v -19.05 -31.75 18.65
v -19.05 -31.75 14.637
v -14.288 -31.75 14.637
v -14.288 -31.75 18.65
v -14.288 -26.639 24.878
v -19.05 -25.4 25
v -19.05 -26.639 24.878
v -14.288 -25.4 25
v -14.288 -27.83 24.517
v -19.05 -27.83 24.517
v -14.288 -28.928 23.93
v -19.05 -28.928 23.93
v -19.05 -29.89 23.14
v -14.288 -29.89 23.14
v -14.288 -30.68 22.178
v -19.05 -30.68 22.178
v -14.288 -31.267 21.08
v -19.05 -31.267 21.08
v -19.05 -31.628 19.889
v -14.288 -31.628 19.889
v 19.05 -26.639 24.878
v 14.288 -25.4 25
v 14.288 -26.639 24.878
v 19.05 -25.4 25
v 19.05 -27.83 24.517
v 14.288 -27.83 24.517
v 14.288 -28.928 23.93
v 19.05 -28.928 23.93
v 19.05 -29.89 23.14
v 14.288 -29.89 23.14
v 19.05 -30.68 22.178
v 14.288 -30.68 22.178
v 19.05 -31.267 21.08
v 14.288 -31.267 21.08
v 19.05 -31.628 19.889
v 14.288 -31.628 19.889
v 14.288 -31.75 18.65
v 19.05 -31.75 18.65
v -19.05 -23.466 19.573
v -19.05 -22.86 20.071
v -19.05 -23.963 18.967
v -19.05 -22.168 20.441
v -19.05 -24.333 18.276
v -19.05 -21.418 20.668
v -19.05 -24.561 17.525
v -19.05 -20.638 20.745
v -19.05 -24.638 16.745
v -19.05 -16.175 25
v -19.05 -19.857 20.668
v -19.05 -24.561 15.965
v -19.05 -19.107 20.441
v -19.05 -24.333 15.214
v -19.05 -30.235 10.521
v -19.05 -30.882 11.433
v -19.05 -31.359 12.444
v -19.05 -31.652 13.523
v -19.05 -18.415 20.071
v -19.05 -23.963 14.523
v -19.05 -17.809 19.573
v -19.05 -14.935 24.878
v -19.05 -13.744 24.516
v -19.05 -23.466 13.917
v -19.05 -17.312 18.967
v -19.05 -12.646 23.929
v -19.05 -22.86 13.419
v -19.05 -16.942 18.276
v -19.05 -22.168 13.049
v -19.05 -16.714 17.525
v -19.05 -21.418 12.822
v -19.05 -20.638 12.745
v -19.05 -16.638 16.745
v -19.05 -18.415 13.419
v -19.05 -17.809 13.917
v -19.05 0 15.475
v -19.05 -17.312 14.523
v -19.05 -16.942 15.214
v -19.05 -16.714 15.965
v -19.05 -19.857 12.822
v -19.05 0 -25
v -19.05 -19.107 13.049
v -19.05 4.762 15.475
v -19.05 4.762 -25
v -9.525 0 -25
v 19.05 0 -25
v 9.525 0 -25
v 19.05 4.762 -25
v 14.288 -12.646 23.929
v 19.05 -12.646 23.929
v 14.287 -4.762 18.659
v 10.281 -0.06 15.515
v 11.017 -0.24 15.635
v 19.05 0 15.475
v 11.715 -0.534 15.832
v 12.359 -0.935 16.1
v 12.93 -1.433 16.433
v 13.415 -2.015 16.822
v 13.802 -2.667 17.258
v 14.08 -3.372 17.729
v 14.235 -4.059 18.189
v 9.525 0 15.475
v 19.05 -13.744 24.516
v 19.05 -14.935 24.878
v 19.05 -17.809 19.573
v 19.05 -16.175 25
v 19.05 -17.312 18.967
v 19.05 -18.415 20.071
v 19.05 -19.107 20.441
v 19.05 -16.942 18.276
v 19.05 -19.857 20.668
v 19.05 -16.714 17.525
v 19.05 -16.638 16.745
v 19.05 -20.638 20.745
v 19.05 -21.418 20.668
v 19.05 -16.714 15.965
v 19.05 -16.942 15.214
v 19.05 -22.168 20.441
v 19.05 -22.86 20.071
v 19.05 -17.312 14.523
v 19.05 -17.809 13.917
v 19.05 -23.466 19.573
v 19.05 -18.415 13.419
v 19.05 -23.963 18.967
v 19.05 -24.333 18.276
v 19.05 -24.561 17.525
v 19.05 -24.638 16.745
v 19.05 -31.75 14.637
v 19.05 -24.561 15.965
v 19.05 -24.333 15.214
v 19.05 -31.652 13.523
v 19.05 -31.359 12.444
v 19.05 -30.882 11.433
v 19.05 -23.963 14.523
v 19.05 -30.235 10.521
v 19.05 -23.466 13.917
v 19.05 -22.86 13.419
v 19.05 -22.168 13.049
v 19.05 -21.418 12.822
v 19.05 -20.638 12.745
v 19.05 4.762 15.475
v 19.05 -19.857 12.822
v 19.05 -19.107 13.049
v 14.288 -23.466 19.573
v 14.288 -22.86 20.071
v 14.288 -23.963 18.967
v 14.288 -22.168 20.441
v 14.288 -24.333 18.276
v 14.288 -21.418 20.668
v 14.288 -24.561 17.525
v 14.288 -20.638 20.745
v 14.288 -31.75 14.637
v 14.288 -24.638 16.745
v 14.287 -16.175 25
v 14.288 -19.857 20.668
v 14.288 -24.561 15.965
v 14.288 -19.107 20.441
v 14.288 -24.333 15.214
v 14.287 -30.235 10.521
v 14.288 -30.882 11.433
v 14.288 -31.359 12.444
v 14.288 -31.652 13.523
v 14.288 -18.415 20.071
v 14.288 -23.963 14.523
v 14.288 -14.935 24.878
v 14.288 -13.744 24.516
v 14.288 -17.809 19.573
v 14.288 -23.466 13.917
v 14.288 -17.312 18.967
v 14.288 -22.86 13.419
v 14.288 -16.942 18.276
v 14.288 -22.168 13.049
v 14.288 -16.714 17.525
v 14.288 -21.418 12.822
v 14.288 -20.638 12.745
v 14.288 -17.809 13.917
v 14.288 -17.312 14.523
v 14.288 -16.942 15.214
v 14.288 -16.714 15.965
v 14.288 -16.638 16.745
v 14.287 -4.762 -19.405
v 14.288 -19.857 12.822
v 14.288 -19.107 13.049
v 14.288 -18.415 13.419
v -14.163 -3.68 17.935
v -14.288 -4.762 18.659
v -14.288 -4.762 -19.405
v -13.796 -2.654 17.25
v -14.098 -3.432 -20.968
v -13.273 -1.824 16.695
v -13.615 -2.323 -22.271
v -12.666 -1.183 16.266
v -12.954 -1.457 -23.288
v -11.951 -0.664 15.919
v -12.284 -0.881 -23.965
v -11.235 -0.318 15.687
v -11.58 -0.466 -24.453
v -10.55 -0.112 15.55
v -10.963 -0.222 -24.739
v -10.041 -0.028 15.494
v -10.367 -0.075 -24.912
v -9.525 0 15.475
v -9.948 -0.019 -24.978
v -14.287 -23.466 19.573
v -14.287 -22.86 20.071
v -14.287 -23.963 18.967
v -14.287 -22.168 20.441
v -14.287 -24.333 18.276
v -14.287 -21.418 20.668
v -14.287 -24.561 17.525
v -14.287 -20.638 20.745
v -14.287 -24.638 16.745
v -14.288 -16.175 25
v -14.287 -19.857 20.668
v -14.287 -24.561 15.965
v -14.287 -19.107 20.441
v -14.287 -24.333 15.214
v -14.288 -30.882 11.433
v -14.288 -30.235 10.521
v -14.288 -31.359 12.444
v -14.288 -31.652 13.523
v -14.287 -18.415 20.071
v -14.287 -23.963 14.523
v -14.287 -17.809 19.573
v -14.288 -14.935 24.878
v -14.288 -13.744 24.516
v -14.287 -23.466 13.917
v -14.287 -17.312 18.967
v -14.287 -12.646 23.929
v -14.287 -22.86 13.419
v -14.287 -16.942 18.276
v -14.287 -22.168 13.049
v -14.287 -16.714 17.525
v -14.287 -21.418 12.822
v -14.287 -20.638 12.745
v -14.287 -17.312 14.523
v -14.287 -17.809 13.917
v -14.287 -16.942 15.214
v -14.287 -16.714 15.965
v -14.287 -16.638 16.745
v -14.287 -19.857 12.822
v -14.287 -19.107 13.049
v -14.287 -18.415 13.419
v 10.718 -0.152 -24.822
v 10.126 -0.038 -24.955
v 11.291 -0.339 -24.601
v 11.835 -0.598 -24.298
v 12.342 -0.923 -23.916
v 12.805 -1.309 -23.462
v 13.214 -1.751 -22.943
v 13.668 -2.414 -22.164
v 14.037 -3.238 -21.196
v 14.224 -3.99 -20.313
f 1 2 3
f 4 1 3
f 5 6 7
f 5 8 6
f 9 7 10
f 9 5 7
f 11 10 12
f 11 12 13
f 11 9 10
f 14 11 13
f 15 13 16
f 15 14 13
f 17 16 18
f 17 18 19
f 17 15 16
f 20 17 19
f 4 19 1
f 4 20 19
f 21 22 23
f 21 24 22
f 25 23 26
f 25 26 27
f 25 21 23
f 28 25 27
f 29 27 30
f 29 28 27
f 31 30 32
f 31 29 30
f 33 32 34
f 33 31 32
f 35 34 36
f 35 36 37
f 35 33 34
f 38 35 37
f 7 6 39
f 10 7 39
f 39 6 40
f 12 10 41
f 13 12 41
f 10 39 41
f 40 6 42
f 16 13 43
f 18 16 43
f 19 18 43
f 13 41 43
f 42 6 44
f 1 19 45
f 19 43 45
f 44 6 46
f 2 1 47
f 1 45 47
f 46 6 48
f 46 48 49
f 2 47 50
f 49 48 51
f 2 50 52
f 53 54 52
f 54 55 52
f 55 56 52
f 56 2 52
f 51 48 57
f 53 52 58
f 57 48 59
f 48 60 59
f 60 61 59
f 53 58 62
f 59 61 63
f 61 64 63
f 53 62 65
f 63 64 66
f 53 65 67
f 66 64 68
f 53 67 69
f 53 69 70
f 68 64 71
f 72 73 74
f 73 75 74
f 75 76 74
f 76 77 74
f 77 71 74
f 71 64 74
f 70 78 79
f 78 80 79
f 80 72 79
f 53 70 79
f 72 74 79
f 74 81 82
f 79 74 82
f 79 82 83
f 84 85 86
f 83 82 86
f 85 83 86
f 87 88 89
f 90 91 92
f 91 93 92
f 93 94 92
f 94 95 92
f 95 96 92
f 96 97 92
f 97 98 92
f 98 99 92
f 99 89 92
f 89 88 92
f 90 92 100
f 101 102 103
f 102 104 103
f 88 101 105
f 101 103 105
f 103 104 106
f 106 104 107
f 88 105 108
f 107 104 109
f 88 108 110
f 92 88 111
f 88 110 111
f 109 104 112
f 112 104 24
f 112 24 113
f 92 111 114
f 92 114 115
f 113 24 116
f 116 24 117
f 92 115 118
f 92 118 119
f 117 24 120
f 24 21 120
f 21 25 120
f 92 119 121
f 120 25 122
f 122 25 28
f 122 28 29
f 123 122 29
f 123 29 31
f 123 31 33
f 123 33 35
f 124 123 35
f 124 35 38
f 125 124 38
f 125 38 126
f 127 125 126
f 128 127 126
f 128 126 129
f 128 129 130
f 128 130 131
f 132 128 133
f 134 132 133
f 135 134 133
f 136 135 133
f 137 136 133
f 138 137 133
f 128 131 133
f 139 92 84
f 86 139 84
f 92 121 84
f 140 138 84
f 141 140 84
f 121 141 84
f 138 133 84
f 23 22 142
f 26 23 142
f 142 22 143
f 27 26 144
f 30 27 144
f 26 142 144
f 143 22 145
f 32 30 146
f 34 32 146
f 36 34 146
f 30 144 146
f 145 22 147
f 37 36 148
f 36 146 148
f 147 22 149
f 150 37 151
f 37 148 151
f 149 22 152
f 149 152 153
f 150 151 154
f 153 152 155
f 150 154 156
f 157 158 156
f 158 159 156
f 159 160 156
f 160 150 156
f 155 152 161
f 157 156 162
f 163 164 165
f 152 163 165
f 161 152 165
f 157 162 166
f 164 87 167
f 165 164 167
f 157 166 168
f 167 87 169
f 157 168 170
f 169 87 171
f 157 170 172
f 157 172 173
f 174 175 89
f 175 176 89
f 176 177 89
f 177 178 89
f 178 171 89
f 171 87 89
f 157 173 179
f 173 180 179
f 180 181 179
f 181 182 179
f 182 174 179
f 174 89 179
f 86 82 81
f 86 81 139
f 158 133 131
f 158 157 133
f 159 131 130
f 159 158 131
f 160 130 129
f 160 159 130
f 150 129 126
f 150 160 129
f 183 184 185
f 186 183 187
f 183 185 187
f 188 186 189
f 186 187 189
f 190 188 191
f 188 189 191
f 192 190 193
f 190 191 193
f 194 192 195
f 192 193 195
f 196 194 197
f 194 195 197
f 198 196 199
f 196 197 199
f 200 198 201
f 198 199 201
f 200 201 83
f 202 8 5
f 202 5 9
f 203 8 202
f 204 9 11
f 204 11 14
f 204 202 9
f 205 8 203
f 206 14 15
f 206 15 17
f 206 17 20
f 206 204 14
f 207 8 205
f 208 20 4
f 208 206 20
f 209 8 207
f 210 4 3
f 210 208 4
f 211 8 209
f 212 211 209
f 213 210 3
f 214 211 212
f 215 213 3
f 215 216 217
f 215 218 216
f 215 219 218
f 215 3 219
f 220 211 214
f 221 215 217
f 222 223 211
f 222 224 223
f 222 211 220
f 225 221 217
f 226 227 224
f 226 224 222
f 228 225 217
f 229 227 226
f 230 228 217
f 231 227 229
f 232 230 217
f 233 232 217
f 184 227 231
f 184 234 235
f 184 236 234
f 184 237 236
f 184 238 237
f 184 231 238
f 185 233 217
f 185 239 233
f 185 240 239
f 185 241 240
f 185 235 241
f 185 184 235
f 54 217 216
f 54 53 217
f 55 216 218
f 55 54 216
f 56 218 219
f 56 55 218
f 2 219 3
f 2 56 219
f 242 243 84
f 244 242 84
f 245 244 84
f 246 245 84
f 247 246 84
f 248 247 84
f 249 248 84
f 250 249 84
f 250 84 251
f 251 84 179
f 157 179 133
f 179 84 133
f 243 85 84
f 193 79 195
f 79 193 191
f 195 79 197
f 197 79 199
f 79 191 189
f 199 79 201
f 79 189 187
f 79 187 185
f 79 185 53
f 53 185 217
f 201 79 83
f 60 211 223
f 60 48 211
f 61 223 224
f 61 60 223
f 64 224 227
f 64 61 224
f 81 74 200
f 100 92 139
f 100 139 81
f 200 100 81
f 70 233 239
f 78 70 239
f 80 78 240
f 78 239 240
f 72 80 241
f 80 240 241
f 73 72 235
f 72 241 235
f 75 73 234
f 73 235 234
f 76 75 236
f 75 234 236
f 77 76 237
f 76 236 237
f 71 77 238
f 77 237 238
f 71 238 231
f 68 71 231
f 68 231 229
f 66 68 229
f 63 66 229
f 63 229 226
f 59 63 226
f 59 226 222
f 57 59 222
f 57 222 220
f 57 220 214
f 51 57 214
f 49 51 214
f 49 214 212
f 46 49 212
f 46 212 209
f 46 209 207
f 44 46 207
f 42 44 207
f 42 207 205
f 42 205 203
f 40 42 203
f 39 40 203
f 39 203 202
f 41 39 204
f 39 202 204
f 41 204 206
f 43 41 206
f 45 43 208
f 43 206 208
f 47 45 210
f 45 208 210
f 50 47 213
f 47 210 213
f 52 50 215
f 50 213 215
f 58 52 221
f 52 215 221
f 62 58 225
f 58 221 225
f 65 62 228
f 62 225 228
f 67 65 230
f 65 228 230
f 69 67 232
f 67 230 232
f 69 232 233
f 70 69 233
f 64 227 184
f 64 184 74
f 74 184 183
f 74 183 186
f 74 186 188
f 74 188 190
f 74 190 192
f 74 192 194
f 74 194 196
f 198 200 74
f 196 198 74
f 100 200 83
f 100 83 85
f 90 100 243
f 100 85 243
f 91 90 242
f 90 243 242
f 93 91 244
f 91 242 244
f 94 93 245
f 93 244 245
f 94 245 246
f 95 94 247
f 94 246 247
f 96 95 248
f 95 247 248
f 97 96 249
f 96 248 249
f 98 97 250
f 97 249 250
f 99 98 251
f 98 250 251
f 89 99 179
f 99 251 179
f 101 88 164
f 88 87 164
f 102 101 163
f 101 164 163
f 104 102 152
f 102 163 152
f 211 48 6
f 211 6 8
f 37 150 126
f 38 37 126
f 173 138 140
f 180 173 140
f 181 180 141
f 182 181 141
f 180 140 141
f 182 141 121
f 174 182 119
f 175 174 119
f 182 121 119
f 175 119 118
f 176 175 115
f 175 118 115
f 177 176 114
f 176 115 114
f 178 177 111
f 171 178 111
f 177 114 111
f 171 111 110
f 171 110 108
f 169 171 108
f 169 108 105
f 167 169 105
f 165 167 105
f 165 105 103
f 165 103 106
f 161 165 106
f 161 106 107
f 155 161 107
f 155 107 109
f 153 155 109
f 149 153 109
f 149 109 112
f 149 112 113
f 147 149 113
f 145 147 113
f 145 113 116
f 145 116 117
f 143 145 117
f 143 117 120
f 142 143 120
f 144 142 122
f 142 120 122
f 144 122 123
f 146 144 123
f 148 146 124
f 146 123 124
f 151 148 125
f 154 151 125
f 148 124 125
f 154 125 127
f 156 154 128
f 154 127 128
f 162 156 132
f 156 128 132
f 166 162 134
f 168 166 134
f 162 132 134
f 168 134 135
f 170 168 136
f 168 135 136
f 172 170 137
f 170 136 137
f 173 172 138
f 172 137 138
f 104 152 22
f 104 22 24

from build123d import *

# Parameters (mm, degrees)
SKETCH1_W           = 4.7625
SKETCH1_H           = 50
SKETCH1_W_2         = 28.575
BOSS_EXTRUDE1_DEPTH = 4.7625
SKETCH1_3_W         = 4.7625
SKETCH1_3_H         = 50
BOSS_EXTRUDE2_DEPTH = 31.75
SKETCH3_R           = 4
CUT_EXTRUDE1_DEPTH  = 39.1
FILLET1_R           = 6.35
FILLET2_R           = 4.7625


with BuildPart() as part:
    # Sketch1 → Boss-Extrude1 (new body)
    with BuildSketch(Plane(origin=(0, 0, 0), x_dir=(1, 0, 0), z_dir=(0, 1, 0))):
        with Locations((-16.66875, 0)):
            Rectangle(SKETCH1_W, SKETCH1_H)
        Rectangle(SKETCH1_W_2, SKETCH1_H)
        with Locations((16.66875, 0)):
            Rectangle(SKETCH1_W, SKETCH1_H)
    extrude(amount=BOSS_EXTRUDE1_DEPTH)

    # Sketch1<3> → Boss-Extrude2 (add)
    with BuildSketch(Plane(origin=(0, 0, 0), x_dir=(1, 0, 0), z_dir=(0, 1, 0))):
        with Locations((-16.66875, 0)):
            Rectangle(SKETCH1_3_W, SKETCH1_3_H)
        with Locations((16.66875, 0)):
            Rectangle(SKETCH1_3_W, SKETCH1_3_H)
    extrude(amount=-BOSS_EXTRUDE2_DEPTH)

    # Sketch3 → Cut-Extrude1 (cut, through all)
    with BuildSketch(Plane(origin=(19.05, 0, 0), x_dir=(0, 0, -1), z_dir=(1, 0, 0))):
        Polygon((25, -31.75), (25, 0), (-12.3, -31.75), align=None)
        Polygon((-15.475, 0), (-15.475, 4.7625), (-25, 4.7625), (-25, 0), (-25, -14.247596398), align=None)
        with Locations((-16.745, -20.6375)):
            Circle(SKETCH3_R)
    extrude(amount=-CUT_EXTRUDE1_DEPTH, mode=Mode.SUBTRACT)

    # Fillet1
    fillet1_edges = [part.edges().sort_by_distance(p)[0] for p in [
        (-16.66875, -31.75, 25),
        (16.66875, -31.75, 25),
        (16.66875, -31.75, 12.3),
        (-16.66875, -31.75, 12.3),
        (16.66875, -14.247596398, 25),
        (-16.66875, -14.247596398, 25),
    ]]
    fillet(fillet1_edges, radius=FILLET1_R)

    # Fillet2
    fillet2_edges = [part.edges().sort_by_distance(p)[0] for p in [
        (14.2875, 0, -4.7625),
        (-14.2875, 0, -4.7625),
    ]]
    fillet(fillet2_edges, radius=FILLET2_R)


solid = part.part
